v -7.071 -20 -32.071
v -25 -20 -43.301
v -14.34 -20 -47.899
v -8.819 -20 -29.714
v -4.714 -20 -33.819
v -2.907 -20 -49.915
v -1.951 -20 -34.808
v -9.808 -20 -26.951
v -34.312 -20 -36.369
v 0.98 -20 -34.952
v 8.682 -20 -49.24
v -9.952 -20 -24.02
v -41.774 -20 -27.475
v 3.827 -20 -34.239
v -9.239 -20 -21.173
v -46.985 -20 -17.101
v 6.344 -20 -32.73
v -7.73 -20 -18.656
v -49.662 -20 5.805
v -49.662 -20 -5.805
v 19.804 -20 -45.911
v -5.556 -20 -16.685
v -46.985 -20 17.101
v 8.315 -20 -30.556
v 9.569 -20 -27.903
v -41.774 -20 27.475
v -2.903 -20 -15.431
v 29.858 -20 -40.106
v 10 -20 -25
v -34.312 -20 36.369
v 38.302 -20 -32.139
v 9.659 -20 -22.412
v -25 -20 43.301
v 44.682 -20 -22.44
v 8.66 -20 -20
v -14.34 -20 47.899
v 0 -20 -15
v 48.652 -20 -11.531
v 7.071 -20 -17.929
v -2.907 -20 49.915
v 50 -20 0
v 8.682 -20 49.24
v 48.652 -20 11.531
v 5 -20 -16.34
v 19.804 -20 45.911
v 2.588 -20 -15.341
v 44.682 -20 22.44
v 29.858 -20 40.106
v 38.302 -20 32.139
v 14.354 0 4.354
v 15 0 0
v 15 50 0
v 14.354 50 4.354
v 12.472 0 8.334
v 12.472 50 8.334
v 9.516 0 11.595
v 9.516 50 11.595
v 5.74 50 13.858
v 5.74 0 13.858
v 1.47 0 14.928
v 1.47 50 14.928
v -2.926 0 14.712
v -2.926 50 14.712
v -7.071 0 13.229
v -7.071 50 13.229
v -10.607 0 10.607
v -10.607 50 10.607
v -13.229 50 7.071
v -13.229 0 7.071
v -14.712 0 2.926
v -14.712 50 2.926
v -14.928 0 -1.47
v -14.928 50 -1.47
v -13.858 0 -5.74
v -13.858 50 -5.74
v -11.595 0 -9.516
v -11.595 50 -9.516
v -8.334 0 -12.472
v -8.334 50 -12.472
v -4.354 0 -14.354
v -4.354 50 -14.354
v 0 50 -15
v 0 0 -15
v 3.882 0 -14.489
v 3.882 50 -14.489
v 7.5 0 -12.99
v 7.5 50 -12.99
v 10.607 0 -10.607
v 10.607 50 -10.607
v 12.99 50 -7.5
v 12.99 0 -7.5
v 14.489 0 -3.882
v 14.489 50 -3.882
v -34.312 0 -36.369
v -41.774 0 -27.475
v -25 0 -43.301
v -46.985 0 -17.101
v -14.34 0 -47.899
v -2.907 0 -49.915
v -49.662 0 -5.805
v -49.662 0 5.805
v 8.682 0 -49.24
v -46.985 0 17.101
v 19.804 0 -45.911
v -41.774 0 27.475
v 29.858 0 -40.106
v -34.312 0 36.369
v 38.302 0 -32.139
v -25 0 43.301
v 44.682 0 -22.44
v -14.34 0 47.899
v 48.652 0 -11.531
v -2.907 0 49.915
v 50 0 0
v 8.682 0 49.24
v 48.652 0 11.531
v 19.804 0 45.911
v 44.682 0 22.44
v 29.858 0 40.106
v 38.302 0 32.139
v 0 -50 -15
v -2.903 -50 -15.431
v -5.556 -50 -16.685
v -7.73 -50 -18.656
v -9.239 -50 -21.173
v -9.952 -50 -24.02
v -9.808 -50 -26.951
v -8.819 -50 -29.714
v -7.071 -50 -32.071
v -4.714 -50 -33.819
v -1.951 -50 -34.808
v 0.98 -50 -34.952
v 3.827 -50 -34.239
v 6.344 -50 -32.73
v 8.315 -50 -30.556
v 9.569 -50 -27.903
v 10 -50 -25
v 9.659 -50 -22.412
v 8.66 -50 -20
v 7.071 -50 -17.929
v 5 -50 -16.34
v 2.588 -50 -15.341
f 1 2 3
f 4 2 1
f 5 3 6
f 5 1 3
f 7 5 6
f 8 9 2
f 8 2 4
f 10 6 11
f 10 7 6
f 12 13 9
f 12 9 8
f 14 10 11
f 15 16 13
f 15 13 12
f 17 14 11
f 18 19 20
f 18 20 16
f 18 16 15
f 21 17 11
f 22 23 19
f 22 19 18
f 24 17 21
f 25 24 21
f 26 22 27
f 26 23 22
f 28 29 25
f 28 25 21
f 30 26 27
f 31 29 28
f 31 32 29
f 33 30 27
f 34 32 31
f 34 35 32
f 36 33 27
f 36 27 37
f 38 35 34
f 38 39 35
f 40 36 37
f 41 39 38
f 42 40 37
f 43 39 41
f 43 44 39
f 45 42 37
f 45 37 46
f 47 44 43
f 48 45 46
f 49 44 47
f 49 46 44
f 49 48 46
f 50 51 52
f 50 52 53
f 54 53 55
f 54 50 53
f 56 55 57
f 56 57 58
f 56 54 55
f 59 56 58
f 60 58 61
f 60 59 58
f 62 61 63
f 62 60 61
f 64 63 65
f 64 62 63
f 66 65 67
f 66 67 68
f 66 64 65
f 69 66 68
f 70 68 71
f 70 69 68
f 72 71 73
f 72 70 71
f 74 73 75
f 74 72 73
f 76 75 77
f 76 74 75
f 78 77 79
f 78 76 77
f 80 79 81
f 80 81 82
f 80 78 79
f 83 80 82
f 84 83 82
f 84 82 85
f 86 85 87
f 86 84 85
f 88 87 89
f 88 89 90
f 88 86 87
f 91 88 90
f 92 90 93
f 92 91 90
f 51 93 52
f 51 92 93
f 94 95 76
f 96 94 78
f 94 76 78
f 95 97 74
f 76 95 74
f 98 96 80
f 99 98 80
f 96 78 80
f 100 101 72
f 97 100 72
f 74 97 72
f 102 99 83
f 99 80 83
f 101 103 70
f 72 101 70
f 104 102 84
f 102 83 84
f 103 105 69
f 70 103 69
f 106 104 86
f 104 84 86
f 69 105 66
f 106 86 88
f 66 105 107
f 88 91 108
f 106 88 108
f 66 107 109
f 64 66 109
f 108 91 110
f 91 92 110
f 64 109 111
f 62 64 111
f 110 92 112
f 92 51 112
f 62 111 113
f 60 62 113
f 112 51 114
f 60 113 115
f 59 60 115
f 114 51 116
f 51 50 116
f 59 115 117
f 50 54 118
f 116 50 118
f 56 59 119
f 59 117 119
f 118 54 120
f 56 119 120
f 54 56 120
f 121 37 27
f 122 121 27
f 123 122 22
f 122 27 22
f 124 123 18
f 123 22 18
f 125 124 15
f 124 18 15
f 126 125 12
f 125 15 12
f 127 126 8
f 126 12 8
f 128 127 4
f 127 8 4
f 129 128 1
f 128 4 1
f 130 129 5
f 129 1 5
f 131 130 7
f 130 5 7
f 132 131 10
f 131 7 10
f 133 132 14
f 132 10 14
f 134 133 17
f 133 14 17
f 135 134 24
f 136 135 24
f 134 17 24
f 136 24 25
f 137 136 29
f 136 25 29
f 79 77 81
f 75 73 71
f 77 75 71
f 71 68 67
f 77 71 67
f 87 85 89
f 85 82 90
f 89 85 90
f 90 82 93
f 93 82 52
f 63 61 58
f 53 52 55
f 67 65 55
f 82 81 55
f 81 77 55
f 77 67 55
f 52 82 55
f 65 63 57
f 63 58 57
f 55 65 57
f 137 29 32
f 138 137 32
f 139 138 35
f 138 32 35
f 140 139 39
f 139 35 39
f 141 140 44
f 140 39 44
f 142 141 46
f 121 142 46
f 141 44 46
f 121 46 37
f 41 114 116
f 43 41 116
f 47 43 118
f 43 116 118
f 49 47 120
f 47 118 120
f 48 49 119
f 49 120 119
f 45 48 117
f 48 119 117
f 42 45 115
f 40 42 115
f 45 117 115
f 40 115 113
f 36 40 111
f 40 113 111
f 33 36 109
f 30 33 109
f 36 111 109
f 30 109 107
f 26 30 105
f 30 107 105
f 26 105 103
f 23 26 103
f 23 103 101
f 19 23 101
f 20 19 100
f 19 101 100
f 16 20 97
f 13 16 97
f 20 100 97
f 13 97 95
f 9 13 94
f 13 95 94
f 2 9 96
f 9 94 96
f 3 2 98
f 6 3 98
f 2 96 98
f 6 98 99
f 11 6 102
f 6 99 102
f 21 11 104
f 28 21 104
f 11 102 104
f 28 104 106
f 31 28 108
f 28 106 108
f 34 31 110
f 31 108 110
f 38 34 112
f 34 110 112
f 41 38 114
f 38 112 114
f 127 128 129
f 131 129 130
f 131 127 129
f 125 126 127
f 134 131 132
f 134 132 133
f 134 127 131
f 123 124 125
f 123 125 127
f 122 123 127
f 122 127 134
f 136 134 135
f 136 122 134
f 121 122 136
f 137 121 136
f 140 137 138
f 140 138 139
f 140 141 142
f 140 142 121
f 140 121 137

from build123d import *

# Parameters (mm, degrees)
F0_R     = 50
F1_DEPTH = 20
F2_DEPTH = 50
F4_DEPTH = 50


with BuildPart() as f1:
    # F0 (on Front) → F1 (new body)
    with BuildSketch(Plane.XZ):
        Circle(F0_R)
        with BuildLine():
            ThreePointArc((0, -15), (7.071068, -17.928932), (10, -25))
            ThreePointArc((10, -25), (-7.071068, -32.071068), (0, -15))
        make_face(mode=Mode.SUBTRACT)
    extrude(amount=F1_DEPTH)

    # F0 (on Front) → F2 (join)
    with BuildSketch(Plane.XZ):
        with BuildLine():
            ThreePointArc((0, -15), (-7.071068, -32.071068), (10, -25))
            ThreePointArc((10, -25), (7.071068, -17.928932), (0, -15))
        make_face()
    extrude(amount=F2_DEPTH)

    # F3 (on face) → F4 (join)
    with BuildSketch(Plane.XZ):
        with BuildLine():
            ThreePointArc((0, -15), (10.606602, -10.606602), (15, 0))
            ThreePointArc((15, 0), (-10.606602, 10.606602), (0, -15))
        make_face()
    extrude(amount=-F4_DEPTH)


solid = f1.part
